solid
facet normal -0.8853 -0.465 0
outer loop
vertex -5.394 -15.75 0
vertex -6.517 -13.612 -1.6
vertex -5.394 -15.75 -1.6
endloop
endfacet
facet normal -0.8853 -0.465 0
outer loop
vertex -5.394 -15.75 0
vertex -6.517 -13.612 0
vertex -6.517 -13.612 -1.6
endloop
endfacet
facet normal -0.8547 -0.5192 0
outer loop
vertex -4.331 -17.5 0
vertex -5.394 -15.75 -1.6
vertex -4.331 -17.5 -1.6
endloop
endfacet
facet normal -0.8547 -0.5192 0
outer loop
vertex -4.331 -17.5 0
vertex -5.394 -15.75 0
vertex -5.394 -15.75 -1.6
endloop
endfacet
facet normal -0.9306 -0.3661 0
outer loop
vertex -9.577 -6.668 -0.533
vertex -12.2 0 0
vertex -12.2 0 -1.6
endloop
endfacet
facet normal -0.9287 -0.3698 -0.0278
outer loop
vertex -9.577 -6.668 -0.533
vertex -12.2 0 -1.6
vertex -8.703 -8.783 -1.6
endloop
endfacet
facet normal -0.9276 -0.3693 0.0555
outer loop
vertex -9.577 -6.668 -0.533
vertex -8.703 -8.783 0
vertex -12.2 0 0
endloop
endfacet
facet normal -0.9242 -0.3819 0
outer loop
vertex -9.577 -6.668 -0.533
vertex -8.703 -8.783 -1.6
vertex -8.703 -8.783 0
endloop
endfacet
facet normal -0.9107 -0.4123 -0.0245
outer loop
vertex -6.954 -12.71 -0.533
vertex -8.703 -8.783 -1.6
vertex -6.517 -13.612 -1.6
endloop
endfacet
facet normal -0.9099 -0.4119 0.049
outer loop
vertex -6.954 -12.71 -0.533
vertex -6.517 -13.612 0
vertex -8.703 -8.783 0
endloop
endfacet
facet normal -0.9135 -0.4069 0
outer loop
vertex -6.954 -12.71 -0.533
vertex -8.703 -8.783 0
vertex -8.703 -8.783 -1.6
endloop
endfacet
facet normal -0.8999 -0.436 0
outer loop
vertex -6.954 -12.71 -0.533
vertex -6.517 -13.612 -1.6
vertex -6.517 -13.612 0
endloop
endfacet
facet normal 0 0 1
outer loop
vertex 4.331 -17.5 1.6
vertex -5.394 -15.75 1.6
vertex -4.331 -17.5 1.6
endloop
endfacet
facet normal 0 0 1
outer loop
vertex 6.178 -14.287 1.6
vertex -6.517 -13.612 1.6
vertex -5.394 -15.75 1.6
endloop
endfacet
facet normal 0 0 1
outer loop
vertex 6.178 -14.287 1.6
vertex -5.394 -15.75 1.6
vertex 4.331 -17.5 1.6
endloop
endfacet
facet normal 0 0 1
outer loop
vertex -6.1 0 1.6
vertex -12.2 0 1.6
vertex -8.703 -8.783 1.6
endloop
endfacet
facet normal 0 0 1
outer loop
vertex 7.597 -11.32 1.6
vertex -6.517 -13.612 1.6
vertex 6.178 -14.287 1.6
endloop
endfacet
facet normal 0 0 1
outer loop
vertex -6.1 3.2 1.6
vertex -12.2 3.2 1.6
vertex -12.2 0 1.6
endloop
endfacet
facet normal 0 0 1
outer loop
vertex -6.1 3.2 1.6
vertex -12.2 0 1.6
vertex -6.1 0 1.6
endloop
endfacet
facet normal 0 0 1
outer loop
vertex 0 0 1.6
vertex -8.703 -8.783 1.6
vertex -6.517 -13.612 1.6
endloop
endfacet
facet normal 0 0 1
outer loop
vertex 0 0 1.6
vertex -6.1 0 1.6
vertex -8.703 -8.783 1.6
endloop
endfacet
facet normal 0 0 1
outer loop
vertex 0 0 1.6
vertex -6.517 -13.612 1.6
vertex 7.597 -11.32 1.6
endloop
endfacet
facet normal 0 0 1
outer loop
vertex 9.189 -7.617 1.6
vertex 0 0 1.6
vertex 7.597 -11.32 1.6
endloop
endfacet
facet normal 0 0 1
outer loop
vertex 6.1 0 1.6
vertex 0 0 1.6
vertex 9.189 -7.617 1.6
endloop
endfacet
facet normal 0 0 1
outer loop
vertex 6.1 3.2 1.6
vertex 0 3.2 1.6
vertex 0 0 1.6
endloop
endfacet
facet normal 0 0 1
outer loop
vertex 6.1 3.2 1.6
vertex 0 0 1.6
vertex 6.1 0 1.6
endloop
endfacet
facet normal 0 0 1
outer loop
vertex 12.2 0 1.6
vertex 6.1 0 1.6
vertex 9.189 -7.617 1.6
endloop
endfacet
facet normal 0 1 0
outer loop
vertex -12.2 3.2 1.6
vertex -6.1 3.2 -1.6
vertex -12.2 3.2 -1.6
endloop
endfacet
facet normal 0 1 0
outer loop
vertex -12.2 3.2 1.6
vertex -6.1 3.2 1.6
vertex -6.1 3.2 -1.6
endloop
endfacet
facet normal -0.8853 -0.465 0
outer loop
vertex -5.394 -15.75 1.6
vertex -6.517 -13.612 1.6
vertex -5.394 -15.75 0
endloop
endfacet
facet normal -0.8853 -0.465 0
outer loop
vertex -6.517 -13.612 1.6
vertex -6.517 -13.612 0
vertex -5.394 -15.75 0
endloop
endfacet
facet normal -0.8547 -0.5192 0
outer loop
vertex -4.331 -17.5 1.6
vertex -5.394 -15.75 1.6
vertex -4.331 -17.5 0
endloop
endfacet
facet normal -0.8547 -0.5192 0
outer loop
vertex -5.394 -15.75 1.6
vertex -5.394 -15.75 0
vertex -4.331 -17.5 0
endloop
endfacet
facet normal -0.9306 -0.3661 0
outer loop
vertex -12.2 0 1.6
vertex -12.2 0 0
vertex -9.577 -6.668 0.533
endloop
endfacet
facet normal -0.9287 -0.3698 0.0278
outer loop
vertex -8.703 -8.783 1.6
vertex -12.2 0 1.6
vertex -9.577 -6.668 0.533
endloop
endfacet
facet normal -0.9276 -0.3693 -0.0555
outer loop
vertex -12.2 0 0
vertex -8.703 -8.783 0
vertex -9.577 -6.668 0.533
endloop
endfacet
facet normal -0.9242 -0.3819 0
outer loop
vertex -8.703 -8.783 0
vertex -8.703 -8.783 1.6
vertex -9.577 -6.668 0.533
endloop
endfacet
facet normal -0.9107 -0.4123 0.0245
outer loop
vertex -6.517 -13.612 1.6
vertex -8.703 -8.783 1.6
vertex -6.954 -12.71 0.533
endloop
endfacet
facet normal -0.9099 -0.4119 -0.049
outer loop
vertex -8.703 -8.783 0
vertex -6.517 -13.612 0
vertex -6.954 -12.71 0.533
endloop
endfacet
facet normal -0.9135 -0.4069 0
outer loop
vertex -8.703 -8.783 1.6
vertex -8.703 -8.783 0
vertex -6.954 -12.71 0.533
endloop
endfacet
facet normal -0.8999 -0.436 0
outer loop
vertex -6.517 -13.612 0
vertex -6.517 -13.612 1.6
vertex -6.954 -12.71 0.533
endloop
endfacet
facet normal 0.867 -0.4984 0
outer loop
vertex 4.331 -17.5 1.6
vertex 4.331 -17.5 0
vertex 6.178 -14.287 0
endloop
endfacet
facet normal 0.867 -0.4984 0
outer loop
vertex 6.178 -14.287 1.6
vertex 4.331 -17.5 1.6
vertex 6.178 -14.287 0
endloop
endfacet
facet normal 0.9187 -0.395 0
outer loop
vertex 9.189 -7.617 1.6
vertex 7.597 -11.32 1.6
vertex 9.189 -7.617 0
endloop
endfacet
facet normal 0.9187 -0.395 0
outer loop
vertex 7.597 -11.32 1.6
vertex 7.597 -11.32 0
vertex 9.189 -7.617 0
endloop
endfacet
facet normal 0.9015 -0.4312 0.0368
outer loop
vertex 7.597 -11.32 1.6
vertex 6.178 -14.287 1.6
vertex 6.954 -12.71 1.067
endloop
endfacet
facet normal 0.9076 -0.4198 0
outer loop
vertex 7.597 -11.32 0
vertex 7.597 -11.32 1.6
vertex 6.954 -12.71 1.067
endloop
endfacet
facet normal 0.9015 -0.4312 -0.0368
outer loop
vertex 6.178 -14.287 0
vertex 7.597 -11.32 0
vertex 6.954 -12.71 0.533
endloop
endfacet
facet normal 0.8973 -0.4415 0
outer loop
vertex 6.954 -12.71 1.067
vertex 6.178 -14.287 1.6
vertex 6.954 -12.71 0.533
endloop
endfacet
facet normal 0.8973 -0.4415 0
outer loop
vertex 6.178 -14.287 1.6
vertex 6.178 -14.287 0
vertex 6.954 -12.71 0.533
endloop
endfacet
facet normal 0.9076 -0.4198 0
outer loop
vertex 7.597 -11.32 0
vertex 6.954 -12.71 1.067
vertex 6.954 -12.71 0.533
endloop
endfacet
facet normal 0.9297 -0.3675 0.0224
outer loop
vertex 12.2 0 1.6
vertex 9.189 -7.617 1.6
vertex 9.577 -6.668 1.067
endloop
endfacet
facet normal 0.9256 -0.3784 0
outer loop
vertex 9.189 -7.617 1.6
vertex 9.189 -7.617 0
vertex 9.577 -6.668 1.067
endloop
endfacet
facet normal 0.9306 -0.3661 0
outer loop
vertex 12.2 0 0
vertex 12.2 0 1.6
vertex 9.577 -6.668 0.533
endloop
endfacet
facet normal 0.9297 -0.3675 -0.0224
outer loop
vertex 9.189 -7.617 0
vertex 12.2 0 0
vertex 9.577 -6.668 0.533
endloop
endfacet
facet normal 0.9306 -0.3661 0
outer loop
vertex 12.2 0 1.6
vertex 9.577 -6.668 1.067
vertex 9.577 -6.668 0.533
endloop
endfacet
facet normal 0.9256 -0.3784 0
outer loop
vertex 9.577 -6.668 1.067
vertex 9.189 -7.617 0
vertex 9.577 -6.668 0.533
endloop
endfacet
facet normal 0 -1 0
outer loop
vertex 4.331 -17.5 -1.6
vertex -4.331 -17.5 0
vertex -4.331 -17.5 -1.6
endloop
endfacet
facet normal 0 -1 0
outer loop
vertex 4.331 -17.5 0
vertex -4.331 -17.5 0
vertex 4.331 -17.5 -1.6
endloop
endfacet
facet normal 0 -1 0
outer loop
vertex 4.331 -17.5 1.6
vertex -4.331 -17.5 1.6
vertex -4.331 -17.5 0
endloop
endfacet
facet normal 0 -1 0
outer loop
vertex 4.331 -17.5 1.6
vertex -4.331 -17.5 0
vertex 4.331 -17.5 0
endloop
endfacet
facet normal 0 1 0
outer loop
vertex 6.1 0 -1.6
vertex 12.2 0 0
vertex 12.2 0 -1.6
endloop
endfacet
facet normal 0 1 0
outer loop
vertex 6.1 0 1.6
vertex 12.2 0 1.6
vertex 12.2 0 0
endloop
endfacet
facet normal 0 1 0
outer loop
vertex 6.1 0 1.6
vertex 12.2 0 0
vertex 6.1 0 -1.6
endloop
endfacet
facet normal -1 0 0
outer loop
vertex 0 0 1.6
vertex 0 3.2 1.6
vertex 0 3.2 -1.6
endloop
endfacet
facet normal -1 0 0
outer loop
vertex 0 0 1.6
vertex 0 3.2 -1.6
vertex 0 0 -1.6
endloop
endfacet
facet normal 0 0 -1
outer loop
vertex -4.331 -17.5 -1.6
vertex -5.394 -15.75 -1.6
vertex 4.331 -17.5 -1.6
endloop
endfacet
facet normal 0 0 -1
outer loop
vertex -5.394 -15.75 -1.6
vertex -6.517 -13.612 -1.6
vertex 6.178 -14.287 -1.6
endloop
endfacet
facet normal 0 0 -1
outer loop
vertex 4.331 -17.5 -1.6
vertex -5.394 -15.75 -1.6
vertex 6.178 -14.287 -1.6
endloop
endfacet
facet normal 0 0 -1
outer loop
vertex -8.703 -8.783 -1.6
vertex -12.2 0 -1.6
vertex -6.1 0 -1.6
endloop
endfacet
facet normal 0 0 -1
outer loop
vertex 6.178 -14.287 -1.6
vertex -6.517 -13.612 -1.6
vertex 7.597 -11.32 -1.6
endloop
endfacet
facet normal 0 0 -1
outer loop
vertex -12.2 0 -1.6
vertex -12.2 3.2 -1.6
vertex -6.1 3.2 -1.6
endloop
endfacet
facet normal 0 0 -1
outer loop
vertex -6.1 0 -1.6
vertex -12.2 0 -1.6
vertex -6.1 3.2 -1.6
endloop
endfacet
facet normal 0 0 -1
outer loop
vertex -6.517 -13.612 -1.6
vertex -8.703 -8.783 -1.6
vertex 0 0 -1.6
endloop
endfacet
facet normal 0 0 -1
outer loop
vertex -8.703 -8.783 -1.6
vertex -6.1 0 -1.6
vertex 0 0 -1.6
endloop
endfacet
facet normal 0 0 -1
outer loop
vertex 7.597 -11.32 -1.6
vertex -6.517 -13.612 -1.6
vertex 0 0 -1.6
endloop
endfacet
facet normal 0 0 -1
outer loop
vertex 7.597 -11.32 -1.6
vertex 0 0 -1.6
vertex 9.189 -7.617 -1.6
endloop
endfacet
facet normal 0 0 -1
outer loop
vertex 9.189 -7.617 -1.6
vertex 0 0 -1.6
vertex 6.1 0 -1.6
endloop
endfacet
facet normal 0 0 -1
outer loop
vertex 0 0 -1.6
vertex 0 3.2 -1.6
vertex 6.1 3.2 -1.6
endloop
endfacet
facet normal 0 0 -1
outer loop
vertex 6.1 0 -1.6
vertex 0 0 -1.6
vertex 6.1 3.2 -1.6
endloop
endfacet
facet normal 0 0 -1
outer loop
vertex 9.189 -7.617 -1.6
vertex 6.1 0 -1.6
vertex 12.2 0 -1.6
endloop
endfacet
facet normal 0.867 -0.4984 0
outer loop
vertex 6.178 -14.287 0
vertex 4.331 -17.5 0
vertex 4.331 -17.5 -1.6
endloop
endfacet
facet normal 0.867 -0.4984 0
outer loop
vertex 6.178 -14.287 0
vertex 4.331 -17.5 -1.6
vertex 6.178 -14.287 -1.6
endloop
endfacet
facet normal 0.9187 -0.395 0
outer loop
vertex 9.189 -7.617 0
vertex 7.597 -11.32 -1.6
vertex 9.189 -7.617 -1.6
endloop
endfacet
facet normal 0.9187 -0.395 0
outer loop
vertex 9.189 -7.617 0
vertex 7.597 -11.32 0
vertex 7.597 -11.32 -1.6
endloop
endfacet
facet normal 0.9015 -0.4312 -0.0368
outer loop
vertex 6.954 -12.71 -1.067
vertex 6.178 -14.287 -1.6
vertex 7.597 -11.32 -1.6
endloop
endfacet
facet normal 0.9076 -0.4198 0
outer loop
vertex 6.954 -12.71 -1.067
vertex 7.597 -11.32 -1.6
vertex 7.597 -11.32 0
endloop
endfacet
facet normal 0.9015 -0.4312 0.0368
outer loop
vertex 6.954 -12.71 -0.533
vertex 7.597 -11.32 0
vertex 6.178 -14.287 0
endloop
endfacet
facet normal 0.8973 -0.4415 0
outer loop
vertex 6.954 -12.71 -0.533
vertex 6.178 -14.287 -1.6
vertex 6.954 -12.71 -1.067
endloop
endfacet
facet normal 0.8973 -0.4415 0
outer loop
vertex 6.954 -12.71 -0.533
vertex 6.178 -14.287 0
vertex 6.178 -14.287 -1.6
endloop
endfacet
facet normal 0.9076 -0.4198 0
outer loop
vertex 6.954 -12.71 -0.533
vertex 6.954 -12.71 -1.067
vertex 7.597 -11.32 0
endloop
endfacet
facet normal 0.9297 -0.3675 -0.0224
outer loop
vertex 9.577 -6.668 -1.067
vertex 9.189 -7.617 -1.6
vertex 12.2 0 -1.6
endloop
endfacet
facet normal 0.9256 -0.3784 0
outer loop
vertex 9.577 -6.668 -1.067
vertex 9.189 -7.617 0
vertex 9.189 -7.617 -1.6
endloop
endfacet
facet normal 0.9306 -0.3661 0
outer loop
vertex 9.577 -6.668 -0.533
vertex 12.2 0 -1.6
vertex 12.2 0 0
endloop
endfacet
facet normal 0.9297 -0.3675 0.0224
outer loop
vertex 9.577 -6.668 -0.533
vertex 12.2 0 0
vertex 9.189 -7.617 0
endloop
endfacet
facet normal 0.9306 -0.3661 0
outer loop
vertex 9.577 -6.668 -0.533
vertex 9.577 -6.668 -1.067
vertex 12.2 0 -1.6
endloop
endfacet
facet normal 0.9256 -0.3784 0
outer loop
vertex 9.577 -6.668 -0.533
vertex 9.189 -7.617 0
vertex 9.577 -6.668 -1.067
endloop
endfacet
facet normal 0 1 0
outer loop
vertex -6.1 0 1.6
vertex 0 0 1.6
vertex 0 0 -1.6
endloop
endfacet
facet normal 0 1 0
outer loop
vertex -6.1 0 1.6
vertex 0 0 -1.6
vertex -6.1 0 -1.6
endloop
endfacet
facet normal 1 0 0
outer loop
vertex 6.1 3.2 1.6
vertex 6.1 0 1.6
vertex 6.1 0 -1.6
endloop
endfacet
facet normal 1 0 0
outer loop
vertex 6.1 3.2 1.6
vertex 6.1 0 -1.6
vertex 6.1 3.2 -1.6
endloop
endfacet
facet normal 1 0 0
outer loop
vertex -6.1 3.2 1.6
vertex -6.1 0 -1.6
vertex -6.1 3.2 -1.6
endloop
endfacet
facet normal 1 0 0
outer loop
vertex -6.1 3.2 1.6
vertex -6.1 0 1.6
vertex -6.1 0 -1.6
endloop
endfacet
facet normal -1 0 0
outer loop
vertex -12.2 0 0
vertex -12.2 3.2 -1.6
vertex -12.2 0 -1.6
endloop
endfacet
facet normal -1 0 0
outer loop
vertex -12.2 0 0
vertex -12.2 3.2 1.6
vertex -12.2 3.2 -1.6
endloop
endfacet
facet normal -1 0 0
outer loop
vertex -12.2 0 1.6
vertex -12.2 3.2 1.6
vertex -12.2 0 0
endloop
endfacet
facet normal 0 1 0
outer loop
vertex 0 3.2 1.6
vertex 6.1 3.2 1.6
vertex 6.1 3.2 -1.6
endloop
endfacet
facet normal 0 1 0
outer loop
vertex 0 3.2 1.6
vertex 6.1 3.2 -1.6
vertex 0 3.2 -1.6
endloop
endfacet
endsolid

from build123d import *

# Parameters (mm, degrees)
F1_DEPTH = 1.6


with BuildPart() as f1:
    # F0 (on Top) → F1 (new body, symmetric)
    with BuildSketch(Plane.XY):
        with BuildLine():
            Line((-12.2, 3.2), (-12.2, 0))
            add(Edge.make_bspline(
                [(-12.2, 0), (-9.5769935198, -6.7725167316), (-6.9539870396, -13.5450334632), (-4.3309805594, -17.5)],
                knots=[0, 0, 0, 0, 0.3225007967, 0.3225007967, 0.3225007967, 0.3225007967], degree=3))
            Line((-4.3309805594, -17.5), (4.3309805594, -17.5))
            add(Edge.make_bspline(
                [(4.3309805594, -17.5), (6.9539870396, -13.5450334632), (9.5769935198, -6.7725167316), (12.2, 0)],
                knots=[0.6774992033, 0.6774992033, 0.6774992033, 0.6774992033, 1, 1, 1, 1], degree=3))
            Line((12.2, 0), (6.1, 0))
            Line((6.1, 0), (6.1, 3.2))
            Line((6.1, 3.2), (0, 3.2))
            Line((0, 3.2), (0, 0))
            Line((0, 0), (-6.1, 0))
            Line((-6.1, 0), (-6.1, 3.2))
            Line((-6.1, 3.2), (-12.2, 3.2))
        make_face()
    extrude(amount=F1_DEPTH, both=True)


solid = f1.part
